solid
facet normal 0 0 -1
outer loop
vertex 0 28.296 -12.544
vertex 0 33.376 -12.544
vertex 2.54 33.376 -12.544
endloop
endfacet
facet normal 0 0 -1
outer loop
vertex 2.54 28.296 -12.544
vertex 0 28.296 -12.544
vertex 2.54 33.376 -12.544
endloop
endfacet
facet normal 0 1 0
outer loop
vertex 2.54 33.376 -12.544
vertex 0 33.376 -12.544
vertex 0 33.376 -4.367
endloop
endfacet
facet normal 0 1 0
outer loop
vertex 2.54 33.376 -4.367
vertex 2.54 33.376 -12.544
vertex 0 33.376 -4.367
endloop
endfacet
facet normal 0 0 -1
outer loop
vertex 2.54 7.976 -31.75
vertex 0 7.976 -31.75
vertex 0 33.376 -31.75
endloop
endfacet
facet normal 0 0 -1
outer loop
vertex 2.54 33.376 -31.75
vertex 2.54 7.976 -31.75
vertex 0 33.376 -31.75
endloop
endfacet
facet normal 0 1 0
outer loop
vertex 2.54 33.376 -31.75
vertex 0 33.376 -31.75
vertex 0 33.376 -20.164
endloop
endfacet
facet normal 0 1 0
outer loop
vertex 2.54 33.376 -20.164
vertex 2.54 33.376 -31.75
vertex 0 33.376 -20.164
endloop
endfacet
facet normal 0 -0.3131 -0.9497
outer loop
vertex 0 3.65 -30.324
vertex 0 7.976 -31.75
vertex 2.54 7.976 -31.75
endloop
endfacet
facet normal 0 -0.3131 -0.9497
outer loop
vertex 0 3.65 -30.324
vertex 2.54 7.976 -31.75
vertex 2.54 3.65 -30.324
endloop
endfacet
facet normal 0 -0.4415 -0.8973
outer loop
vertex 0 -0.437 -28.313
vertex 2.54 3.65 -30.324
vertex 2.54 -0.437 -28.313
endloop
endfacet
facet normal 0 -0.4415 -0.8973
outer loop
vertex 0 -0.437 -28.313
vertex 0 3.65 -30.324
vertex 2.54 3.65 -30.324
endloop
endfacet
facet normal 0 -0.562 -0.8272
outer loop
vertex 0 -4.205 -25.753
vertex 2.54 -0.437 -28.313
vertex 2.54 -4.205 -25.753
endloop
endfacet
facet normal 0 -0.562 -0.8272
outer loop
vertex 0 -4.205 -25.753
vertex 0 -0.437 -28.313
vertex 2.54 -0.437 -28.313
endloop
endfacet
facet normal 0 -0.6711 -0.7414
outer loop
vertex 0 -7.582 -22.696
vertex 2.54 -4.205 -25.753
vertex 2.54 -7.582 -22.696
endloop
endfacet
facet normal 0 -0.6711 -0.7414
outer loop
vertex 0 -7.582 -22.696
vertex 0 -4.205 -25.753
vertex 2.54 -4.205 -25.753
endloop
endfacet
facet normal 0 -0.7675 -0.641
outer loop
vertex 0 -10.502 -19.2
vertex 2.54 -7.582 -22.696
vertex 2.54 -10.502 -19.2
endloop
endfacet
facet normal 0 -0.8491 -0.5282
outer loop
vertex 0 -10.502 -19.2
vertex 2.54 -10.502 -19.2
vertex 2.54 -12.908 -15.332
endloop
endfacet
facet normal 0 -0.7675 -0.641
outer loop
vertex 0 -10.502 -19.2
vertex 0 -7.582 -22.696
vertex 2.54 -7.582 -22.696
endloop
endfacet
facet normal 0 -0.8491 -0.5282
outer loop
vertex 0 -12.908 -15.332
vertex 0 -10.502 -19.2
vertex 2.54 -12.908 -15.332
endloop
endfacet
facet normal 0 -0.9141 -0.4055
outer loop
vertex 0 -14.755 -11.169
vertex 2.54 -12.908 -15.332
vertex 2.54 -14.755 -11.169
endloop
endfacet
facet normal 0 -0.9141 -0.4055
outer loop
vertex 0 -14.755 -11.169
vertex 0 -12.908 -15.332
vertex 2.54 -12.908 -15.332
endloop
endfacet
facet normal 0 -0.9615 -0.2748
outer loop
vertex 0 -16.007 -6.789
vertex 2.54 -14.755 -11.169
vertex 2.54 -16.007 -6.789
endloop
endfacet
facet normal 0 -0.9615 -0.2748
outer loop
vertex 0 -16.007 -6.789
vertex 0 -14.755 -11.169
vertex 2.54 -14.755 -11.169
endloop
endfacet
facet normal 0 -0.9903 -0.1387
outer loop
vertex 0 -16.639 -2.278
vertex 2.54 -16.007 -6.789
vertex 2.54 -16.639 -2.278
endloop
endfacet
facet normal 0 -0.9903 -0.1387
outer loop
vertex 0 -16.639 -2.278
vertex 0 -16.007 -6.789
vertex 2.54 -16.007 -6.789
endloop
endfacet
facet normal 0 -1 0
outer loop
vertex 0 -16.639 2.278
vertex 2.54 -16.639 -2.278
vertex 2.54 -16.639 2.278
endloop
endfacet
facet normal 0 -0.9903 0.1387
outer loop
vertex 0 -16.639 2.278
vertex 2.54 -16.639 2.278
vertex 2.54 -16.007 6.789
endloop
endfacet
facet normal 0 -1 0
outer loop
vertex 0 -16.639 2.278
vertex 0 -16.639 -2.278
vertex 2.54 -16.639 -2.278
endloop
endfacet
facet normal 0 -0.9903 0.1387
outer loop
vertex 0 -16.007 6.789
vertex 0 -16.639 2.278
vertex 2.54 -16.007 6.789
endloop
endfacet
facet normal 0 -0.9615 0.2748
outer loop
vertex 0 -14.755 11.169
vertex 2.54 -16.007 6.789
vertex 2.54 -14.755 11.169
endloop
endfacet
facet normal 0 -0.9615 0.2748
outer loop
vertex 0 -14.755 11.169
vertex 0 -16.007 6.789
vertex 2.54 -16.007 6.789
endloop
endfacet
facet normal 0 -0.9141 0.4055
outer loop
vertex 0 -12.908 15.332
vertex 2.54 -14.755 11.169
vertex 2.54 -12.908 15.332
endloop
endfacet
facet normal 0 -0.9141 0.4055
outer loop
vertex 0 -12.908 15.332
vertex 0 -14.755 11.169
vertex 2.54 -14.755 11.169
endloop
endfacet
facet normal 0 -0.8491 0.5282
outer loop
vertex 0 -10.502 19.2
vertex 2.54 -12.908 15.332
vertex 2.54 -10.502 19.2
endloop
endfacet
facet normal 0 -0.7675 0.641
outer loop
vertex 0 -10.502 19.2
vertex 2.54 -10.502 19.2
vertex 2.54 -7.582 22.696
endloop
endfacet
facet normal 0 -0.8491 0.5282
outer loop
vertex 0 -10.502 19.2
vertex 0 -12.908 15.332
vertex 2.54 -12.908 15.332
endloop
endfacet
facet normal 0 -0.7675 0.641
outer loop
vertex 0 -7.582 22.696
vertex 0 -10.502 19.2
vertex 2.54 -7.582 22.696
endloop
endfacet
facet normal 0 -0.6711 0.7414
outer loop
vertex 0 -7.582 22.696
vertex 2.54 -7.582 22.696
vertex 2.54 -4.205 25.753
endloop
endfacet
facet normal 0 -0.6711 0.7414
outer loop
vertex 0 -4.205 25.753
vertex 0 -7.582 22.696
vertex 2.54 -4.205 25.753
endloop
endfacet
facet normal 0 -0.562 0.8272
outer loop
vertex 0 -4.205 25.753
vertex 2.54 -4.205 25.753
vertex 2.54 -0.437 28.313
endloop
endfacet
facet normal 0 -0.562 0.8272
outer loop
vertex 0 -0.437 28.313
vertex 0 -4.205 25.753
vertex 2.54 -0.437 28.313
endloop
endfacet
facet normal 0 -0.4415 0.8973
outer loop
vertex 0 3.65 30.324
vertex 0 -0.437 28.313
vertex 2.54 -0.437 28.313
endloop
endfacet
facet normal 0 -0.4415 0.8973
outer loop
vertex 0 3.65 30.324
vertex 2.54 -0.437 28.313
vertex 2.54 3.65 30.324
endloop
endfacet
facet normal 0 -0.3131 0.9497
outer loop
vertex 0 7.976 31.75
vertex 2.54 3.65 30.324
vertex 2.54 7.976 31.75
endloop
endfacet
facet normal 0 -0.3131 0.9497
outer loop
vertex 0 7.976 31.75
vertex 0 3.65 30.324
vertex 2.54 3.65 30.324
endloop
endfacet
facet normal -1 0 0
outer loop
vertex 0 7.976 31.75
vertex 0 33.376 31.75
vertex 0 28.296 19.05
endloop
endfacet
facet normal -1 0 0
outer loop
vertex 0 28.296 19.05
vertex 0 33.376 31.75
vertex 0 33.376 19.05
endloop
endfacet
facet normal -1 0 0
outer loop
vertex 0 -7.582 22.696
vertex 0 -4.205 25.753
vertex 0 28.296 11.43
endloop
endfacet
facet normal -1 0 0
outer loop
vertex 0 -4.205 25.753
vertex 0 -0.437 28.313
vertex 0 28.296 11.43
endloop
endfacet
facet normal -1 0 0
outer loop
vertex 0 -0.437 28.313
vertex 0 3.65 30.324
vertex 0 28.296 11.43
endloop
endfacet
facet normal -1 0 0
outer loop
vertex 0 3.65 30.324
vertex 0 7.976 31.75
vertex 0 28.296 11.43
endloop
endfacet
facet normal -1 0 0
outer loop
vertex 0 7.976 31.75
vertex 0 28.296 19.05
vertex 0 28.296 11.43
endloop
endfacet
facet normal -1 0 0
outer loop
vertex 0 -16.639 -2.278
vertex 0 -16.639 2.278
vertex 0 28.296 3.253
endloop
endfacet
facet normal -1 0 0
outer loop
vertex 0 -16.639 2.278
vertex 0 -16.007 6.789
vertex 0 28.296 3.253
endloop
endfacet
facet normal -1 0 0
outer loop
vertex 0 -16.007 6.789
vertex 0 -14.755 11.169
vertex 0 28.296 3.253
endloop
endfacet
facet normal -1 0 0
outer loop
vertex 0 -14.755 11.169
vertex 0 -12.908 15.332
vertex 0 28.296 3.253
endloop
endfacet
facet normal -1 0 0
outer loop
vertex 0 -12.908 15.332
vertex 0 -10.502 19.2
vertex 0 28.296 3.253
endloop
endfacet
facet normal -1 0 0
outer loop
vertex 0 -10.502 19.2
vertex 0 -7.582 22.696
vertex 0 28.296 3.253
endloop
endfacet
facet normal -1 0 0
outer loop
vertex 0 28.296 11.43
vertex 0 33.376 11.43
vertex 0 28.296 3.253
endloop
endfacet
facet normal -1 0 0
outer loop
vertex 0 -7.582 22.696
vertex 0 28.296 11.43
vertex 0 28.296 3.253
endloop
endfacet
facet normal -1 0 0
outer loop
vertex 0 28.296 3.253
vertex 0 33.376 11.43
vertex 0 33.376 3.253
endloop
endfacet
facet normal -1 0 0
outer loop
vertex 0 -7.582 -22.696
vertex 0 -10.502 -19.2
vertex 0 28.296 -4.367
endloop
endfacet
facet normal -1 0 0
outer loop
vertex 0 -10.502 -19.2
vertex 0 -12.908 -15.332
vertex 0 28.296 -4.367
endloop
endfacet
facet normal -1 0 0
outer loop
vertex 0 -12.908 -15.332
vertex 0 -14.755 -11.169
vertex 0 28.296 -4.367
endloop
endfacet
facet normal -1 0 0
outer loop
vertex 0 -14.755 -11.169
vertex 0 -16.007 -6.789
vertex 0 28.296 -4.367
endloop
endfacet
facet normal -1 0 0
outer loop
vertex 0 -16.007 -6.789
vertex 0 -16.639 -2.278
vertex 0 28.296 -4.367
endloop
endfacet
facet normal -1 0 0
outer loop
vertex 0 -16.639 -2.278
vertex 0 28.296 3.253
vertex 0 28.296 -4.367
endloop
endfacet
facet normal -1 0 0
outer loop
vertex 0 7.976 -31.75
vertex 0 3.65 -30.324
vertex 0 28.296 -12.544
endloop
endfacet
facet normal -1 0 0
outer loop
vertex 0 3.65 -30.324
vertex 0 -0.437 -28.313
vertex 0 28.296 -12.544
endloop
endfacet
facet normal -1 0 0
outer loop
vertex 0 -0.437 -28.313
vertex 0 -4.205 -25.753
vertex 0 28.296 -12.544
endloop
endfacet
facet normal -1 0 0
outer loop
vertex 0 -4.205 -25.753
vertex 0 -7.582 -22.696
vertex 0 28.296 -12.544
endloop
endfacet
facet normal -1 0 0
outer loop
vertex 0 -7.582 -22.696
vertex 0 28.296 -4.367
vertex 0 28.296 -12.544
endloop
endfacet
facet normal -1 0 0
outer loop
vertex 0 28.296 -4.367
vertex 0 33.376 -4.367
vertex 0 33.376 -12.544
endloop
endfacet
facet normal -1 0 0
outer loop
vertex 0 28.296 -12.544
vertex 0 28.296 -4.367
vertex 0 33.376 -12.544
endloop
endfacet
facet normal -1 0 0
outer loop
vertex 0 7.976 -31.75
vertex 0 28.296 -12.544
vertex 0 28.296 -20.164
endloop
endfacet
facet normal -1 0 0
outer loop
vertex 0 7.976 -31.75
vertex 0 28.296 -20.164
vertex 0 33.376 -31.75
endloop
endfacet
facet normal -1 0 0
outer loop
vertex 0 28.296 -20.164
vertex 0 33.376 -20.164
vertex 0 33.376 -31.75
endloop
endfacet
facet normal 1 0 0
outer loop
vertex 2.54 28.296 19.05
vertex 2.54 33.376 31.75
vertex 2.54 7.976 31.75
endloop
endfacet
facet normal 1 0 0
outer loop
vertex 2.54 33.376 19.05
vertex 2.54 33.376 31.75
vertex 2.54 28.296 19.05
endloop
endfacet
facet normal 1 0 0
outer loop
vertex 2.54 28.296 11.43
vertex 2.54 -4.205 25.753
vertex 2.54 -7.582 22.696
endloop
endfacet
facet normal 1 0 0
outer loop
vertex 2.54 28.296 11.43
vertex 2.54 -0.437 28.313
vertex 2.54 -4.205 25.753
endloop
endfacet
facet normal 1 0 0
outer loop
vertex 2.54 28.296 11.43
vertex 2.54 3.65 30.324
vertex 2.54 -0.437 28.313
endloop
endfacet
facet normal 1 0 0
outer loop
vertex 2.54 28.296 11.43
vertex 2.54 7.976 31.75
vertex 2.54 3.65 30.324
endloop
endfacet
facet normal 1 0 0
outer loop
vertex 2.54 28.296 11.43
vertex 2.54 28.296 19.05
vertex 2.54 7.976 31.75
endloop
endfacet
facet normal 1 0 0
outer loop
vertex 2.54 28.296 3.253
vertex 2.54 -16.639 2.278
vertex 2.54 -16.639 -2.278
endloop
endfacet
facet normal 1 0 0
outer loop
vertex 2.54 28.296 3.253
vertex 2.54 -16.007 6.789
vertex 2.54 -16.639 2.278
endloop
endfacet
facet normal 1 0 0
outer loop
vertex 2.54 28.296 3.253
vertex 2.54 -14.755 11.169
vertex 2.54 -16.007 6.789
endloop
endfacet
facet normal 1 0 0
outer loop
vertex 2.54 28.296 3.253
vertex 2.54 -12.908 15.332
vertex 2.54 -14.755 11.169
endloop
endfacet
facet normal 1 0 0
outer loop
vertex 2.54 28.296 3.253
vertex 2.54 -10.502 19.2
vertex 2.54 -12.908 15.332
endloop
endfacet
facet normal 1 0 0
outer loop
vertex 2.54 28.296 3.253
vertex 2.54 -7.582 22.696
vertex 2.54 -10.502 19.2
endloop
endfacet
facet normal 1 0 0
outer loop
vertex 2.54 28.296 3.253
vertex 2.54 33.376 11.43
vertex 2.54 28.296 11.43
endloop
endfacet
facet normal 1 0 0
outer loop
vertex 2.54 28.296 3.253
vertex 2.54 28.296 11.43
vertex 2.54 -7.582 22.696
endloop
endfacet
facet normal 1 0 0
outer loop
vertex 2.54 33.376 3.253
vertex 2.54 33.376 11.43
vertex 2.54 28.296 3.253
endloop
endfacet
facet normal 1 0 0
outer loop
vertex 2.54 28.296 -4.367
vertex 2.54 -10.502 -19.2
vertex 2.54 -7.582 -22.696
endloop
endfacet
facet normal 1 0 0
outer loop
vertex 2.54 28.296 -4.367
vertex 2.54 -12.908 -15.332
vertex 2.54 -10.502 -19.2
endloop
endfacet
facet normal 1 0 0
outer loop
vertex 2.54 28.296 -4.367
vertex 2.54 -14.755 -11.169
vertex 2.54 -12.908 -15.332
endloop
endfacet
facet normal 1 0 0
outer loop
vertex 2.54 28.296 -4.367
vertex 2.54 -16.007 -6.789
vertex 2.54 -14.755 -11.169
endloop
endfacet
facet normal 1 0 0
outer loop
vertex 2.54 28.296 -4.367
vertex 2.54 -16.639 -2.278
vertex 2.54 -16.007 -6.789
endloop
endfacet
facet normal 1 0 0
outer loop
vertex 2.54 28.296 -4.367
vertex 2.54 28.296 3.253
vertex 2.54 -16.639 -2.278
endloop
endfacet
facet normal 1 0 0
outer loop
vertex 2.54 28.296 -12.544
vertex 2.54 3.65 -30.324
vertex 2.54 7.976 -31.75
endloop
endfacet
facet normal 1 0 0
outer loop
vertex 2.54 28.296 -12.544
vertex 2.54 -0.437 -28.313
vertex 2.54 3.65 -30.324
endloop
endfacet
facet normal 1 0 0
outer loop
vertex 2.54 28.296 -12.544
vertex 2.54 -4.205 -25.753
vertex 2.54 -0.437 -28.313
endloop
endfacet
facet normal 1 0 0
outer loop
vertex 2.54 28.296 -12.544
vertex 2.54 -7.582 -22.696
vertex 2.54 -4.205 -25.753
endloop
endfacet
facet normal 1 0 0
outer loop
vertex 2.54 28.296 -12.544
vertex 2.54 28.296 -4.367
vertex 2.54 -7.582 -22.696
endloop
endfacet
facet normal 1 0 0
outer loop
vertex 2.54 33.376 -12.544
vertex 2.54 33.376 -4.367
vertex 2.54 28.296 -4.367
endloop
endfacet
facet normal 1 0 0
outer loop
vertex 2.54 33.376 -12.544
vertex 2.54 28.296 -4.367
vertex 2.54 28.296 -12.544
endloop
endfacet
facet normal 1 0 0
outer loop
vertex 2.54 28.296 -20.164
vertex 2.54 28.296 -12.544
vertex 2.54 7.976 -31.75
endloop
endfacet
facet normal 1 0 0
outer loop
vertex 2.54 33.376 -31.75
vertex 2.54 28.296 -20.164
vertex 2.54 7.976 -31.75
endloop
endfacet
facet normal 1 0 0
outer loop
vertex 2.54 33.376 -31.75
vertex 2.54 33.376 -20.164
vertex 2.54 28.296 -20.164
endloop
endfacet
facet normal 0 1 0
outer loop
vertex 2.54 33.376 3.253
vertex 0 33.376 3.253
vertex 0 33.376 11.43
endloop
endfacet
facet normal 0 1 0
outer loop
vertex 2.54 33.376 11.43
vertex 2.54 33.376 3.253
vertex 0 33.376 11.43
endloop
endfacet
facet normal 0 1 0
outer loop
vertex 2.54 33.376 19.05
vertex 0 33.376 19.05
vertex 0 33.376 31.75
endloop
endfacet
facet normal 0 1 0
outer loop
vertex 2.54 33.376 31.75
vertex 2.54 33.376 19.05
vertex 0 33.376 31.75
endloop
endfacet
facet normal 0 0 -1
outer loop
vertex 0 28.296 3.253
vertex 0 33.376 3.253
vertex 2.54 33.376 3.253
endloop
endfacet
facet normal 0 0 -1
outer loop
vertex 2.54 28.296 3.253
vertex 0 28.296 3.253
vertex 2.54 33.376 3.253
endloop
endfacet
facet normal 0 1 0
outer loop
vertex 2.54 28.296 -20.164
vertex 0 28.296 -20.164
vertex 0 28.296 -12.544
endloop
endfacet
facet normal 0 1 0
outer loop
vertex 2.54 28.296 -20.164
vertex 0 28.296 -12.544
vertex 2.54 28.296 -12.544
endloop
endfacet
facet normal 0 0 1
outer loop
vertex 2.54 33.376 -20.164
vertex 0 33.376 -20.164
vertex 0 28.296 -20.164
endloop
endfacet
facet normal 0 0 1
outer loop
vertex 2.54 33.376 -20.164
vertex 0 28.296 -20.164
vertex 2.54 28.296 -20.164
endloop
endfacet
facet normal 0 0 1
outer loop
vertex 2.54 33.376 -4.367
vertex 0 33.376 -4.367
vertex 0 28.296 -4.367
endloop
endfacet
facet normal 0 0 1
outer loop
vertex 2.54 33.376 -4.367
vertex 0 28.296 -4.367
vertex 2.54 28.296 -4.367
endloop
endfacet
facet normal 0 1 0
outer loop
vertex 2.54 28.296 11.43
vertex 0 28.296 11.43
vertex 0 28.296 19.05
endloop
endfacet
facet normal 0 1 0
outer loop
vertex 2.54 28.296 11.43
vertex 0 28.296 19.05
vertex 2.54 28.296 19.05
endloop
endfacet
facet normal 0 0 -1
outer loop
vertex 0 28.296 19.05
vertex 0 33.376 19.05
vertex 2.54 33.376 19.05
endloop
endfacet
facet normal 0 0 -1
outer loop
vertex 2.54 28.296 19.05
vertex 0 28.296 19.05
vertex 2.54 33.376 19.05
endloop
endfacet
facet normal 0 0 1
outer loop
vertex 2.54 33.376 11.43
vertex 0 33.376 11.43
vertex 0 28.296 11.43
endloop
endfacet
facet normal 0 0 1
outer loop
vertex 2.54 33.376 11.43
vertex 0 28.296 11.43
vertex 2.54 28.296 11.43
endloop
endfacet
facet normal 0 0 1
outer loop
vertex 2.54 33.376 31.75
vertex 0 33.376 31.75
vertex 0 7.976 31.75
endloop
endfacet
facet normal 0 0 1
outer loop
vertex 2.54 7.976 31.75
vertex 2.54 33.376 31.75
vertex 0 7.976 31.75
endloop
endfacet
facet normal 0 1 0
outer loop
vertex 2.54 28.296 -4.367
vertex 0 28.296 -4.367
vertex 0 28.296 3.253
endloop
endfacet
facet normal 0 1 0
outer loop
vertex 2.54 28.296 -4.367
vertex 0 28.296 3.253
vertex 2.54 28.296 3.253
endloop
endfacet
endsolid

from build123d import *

# Parameters (mm, degrees)
BOSS_EXTRUDE2_DEPTH = 2.54
SKETCH3_W           = 2.54
SKETCH3_H           = 7.62
CUT_EXTRUDE2_DEPTH  = 5.08


with BuildPart() as part:
    # Sketch1 → Boss-Extrude2 (new body)
    with BuildSketch(Plane(origin=(0, 0, 0), x_dir=(0, 0, -1), z_dir=(1, 0, 0))):
        Polygon((-31.75, 33.376269743), (-31.75, 7.976269743), (31.75, 7.976269743), (31.75, 33.376269743), (0, 33.376269743), align=None)
        with BuildLine():
            ThreePointArc((31.75, 7.976269743), (0, -16.718131707), (-31.75, 7.976269743))
            Line((-31.75, 7.976269743), (31.75, 7.976269743))
        make_face()
    extrude(amount=BOSS_EXTRUDE2_DEPTH)

    # Sketch3 → Cut-Extrude2 (cut)
    with BuildSketch(Plane(origin=(0, 33.376269743, 0), x_dir=(1, 0, 0), z_dir=(0, 1, 0))):
        with Locations((1.27, -15.24)):
            Rectangle(SKETCH3_W, SKETCH3_H)
        with Locations((1.27, 0.557082085)):
            Rectangle(SKETCH3_W, SKETCH3_H)
        with Locations((1.27, 16.35416417)):
            Rectangle(SKETCH3_W, SKETCH3_H)
    extrude(amount=-CUT_EXTRUDE2_DEPTH, mode=Mode.SUBTRACT)


solid = part.part
